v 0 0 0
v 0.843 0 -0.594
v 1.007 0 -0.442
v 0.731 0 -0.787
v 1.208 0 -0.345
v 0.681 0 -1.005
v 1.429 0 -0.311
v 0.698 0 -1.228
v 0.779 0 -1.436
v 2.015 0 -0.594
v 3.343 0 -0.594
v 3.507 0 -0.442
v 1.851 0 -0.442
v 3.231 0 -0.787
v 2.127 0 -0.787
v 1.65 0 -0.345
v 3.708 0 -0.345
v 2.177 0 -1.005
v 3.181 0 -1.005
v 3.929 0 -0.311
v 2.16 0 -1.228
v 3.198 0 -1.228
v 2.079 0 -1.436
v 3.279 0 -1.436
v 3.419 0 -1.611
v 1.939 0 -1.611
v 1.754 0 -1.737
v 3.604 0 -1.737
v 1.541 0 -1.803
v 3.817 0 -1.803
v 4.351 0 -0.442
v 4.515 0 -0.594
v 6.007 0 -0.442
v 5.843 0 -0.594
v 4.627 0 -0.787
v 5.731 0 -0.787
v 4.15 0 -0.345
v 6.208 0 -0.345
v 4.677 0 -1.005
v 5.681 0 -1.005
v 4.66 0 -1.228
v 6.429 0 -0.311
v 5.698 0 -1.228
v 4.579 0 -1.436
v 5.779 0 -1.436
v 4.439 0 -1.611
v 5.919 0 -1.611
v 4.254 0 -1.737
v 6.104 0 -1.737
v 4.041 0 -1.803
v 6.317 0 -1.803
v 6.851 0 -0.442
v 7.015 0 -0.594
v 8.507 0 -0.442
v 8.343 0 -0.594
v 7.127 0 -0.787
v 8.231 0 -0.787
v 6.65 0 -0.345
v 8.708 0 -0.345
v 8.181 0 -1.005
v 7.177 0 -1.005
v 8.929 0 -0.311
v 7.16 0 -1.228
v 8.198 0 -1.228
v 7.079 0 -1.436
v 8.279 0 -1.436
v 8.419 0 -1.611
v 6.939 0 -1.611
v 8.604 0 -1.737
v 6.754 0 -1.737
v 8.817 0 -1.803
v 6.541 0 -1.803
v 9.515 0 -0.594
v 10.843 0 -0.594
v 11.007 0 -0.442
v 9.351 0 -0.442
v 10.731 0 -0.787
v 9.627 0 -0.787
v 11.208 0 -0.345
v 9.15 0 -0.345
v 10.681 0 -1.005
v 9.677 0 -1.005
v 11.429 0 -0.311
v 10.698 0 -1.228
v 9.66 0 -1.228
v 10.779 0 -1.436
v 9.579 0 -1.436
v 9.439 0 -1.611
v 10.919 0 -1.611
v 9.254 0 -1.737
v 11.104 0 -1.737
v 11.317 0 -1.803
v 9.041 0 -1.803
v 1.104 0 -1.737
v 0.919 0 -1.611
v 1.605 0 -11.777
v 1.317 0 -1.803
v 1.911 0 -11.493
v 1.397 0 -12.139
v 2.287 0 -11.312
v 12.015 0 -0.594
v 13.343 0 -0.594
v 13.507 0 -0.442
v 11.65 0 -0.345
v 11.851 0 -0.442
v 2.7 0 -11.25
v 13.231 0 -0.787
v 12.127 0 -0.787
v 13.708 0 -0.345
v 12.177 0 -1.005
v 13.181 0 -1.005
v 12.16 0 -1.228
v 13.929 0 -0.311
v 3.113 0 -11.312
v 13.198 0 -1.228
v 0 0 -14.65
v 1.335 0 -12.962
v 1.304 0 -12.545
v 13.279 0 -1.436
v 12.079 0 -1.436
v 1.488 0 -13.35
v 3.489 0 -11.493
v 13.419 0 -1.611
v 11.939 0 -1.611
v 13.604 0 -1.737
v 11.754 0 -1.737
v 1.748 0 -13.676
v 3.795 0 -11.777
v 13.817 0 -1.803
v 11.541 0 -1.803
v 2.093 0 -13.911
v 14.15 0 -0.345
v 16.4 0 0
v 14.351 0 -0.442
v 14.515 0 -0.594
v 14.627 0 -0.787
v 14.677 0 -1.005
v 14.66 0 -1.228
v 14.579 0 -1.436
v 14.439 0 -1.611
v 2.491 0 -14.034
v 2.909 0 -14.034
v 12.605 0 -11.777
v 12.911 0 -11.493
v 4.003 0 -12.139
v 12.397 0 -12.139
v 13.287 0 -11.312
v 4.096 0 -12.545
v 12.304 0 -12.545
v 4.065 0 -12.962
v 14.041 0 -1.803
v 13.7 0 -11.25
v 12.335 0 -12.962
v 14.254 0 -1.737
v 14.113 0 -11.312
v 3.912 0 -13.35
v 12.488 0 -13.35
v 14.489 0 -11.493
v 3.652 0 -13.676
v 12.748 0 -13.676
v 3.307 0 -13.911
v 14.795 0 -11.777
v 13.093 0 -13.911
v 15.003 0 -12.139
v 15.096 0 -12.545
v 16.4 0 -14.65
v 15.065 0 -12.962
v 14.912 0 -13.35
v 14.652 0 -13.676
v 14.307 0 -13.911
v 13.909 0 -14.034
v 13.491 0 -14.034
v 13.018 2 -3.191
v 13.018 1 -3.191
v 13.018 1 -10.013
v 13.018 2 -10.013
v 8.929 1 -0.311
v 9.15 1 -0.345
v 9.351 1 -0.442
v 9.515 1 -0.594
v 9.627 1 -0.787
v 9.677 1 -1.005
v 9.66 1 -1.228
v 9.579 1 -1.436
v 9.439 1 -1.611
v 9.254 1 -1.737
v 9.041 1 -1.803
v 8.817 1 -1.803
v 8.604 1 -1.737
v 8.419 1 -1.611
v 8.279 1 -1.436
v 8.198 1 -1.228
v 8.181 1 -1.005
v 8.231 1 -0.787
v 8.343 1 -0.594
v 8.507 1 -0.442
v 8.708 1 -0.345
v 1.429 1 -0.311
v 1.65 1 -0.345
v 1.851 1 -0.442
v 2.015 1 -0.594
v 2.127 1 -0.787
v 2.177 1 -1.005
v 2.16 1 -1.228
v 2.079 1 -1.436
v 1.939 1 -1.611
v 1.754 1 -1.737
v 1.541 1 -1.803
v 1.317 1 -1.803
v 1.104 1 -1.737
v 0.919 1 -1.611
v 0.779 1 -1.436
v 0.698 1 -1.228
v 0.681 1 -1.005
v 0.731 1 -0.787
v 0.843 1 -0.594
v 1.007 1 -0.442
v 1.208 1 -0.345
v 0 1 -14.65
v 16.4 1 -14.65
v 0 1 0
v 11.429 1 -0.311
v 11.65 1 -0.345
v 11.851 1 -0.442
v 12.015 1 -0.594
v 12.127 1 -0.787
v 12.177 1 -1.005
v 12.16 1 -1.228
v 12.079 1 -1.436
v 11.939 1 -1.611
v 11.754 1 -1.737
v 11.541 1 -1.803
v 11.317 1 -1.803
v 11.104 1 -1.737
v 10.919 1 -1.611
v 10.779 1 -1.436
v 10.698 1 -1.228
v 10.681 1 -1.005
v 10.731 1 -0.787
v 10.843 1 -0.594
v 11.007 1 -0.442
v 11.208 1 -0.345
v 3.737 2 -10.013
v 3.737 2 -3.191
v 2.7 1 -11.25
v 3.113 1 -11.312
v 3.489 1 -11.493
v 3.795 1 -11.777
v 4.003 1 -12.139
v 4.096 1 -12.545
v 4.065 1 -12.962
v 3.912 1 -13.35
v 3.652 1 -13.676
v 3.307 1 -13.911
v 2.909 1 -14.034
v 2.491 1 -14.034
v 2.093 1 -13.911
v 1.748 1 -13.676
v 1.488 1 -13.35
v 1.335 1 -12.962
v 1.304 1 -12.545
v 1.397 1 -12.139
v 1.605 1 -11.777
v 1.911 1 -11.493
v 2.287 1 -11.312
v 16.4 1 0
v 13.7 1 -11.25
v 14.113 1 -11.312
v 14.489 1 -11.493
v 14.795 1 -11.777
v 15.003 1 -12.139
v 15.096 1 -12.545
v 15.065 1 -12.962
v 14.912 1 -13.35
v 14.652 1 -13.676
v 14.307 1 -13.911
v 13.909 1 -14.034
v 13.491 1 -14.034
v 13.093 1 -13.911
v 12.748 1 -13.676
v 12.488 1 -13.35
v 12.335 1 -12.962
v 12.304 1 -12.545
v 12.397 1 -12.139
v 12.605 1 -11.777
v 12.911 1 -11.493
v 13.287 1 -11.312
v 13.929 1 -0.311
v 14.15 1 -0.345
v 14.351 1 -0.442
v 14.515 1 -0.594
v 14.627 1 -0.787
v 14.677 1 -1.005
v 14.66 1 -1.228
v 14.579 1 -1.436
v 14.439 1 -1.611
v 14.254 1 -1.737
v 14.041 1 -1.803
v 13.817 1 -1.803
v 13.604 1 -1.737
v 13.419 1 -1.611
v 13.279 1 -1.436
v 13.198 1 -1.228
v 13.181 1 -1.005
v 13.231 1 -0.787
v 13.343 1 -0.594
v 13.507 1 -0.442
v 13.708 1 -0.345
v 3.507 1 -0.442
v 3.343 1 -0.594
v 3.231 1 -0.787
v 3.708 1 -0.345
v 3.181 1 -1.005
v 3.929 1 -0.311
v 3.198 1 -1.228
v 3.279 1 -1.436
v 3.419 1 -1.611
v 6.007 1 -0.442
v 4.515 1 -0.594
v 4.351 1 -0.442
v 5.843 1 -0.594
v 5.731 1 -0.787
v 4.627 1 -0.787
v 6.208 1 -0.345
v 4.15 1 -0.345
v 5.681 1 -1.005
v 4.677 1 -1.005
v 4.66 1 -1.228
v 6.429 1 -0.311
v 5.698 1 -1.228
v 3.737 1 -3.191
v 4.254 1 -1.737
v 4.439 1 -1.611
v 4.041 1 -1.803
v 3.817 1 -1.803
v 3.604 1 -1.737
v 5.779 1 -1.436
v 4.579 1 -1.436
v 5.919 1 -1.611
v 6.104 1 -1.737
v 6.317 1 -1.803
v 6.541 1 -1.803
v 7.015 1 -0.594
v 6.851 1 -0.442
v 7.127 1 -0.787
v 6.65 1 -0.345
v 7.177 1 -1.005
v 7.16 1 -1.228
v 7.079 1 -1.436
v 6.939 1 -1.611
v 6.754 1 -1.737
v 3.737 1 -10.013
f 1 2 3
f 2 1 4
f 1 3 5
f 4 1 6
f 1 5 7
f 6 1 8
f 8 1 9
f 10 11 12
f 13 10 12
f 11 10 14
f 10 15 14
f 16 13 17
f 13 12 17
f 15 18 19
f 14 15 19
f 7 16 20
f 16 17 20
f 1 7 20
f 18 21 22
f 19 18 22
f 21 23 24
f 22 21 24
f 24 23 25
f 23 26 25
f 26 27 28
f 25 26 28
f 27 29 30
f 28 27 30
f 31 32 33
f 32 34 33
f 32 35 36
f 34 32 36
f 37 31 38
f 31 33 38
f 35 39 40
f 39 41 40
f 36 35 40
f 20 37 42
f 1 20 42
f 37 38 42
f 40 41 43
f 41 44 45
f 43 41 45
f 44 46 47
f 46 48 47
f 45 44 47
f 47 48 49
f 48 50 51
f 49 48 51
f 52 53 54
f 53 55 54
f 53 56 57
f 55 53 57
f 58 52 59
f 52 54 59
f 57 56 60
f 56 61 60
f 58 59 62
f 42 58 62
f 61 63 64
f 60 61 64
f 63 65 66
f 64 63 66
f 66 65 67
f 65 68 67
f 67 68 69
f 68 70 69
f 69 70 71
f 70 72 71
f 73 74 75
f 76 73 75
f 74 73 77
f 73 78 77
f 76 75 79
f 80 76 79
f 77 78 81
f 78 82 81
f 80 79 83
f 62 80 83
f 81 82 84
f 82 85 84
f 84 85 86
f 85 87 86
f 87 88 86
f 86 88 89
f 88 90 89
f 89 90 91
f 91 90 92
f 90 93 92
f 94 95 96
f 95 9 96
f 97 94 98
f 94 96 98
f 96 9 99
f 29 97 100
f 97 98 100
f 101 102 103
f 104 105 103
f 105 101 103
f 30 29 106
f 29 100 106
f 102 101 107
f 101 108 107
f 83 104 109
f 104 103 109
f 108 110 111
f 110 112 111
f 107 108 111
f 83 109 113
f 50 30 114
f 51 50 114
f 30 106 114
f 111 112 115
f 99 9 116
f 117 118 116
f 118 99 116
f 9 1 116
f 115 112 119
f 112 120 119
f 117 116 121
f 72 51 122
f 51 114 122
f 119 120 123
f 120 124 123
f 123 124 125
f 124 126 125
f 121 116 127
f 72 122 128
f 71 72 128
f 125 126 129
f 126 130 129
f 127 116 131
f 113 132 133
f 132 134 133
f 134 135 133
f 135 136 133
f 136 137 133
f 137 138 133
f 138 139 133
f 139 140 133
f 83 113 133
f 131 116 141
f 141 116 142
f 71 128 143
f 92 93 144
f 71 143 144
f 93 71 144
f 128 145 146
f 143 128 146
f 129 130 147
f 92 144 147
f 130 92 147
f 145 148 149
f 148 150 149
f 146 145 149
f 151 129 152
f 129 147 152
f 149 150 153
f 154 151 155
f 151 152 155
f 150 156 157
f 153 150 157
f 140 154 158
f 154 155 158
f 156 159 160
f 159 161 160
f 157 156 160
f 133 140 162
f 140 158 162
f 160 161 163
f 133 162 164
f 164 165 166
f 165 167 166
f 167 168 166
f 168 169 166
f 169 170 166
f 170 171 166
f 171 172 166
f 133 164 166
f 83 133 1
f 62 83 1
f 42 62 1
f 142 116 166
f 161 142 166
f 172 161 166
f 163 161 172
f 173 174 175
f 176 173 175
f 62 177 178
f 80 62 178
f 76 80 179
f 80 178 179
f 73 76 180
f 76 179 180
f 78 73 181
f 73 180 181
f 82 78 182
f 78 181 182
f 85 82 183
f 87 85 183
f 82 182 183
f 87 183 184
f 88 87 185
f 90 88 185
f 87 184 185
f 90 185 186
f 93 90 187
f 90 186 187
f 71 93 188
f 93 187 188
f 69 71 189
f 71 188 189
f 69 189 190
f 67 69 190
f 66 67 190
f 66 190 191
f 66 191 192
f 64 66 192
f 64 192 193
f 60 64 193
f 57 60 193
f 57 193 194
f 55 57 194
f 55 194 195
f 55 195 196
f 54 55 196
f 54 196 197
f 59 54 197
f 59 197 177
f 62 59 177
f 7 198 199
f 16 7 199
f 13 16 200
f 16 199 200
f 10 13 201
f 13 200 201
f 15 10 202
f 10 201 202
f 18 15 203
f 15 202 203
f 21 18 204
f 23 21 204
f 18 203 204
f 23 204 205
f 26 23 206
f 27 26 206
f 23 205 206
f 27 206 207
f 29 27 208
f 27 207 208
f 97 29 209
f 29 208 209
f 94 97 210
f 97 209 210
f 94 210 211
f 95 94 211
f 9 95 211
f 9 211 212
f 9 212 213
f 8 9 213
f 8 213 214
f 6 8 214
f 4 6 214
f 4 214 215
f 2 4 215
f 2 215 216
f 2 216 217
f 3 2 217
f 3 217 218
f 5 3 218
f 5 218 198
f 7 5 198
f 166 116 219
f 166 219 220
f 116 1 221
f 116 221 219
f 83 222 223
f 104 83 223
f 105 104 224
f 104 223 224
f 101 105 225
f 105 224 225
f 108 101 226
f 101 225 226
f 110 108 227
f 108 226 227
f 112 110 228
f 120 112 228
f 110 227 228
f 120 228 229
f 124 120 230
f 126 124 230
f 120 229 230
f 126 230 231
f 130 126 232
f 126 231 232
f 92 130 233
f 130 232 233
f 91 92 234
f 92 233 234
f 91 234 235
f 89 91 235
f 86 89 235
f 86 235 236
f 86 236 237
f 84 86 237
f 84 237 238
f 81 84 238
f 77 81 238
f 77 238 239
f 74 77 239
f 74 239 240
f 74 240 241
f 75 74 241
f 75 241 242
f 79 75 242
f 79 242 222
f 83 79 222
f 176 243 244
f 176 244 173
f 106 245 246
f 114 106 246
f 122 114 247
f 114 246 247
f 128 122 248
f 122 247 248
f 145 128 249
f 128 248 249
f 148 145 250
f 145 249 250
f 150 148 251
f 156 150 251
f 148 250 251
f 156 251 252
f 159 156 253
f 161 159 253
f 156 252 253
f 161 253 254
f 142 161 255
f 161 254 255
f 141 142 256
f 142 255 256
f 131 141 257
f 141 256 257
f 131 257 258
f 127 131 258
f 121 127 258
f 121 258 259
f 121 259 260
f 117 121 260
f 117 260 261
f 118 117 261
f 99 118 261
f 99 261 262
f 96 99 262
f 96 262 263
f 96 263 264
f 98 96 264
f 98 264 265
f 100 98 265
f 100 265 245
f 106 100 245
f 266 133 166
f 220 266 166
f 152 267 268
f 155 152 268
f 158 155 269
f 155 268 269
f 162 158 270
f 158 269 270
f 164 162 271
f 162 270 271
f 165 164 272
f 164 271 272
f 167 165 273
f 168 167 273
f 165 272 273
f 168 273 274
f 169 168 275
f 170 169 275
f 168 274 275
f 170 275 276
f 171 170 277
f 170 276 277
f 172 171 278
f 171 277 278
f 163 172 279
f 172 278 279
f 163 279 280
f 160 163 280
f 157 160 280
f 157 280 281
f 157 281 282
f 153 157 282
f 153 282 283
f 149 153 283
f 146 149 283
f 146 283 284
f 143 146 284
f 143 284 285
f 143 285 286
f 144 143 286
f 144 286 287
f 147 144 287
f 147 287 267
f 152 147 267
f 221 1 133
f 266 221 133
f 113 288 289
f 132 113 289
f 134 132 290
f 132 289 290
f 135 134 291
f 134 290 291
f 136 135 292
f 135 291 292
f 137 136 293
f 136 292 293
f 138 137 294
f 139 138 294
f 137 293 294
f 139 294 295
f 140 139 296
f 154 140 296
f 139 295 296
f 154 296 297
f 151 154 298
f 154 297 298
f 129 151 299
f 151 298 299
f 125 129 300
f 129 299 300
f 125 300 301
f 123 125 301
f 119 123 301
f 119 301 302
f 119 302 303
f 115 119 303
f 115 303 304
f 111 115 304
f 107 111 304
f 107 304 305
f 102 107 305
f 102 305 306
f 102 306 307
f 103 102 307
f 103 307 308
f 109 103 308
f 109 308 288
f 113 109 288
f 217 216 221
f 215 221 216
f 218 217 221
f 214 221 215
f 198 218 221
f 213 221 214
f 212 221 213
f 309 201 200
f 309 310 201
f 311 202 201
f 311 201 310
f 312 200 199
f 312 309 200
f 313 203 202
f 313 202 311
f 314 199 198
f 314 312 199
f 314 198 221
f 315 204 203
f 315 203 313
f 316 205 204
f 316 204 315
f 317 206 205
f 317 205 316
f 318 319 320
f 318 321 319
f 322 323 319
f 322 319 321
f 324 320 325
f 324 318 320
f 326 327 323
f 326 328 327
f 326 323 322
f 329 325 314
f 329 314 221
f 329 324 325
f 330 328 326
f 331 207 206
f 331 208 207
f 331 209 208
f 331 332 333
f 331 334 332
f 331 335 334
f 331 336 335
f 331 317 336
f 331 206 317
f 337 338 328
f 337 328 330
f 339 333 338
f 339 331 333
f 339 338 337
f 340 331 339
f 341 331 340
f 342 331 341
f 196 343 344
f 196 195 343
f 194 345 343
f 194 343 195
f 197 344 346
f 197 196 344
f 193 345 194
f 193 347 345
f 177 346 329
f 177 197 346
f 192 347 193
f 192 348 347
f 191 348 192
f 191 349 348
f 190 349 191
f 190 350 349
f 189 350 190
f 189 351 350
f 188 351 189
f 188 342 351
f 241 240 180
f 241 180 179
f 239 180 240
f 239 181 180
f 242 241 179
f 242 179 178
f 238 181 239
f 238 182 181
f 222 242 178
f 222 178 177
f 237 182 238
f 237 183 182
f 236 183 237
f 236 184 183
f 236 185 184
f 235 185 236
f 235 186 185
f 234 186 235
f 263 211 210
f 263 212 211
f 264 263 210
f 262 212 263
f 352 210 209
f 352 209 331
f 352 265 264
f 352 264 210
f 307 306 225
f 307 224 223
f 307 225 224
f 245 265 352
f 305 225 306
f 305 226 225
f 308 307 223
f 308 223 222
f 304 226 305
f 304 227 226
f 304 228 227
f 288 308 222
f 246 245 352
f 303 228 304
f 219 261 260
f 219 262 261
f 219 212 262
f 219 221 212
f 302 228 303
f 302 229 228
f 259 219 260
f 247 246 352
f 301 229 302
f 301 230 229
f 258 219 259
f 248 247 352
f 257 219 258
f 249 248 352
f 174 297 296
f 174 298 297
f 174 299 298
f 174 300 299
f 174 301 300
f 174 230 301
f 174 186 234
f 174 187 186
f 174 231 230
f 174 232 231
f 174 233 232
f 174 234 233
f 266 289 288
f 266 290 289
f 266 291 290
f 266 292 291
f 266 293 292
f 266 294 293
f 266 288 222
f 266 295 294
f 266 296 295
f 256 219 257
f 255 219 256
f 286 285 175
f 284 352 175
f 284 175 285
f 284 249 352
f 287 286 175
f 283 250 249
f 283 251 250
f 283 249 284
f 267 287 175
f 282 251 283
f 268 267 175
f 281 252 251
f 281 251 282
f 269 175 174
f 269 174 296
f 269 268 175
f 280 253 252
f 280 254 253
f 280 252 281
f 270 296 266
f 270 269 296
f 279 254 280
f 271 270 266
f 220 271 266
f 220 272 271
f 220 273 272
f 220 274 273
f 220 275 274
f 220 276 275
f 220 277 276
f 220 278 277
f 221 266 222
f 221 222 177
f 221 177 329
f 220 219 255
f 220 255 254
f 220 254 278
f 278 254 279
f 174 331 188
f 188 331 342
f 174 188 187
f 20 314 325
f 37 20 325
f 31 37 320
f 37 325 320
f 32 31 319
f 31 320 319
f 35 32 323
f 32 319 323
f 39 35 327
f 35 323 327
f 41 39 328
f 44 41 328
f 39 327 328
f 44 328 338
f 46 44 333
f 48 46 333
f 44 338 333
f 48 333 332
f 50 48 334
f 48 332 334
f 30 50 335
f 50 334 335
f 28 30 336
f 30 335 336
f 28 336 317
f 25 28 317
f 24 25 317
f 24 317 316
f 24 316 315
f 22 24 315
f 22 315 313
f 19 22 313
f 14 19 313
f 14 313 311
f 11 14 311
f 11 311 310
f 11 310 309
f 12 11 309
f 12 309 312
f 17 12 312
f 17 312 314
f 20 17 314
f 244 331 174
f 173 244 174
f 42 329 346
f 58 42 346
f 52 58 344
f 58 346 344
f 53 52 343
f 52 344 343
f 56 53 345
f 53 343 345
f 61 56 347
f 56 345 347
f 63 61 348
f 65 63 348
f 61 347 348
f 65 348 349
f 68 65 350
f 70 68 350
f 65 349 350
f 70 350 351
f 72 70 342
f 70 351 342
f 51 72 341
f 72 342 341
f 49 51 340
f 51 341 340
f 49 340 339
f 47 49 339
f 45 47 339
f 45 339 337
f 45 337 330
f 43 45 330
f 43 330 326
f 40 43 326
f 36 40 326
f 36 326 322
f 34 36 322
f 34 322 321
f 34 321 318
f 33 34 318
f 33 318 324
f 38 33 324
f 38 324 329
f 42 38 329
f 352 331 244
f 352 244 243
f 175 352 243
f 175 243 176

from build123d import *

# Parameters (mm, degrees)
SKETCH1_W           = 16.4
SKETCH1_H           = 14.65
BOSS_EXTRUDE1_DEPTH = 1
SKETCH2_R           = 0.75
SKETCH2_R_2         = 1.4
CUT_EXTRUDE1_DEPTH  = 23.013234656
SKETCH3_W           = 9.281589498
SKETCH3_H           = 6.821714685
BOSS_EXTRUDE2_DEPTH = 1


with BuildPart() as part:
    # Sketch1 → Boss-Extrude1 (new body)
    with BuildSketch(Plane(origin=(0, 0, 0), x_dir=(1, 0, 0), z_dir=(0, 1, 0))):
        with Locations((8.2, 7.325)):
            Rectangle(SKETCH1_W, SKETCH1_H)
    extrude(amount=BOSS_EXTRUDE1_DEPTH)

    # Sketch2 → Cut-Extrude1 (cut, through all)
    with BuildSketch(Plane(origin=(0, 1, 0), x_dir=(1, 0, 0), z_dir=(0, 1, 0))):
        with Locations(Location((1.429004383, 1.061195066, 0), (0, 0, 270))):
            Circle(SKETCH2_R)
        with Locations(Location((3.929004383, 1.061195066, 0), (0, 0, 270))):
            Circle(SKETCH2_R)
        with Locations(Location((6.429004383, 1.061195066, 0), (0, 0, 270))):
            Circle(SKETCH2_R)
        with Locations(Location((8.929004383, 1.061195066, 0), (0, 0, 270))):
            Circle(SKETCH2_R)
        with Locations(Location((11.429004383, 1.061195066, 0), (0, 0, 270))):
            Circle(SKETCH2_R)
        with Locations(Location((13.929004383, 1.061195066, 0), (0, 0, 270))):
            Circle(SKETCH2_R)
        with Locations(Location((2.7, 12.65, 0), (0, 0, 270))):
            Circle(SKETCH2_R_2)
        with Locations(Location((13.7, 12.65, 0), (0, 0, 270))):
            Circle(SKETCH2_R_2)
    extrude(amount=-CUT_EXTRUDE1_DEPTH, mode=Mode.SUBTRACT)

    # Sketch3 → Boss-Extrude2 (add)
    with BuildSketch(Plane(origin=(0, 1, 0), x_dir=(1, 0, 0), z_dir=(0, 1, 0))):
        with Locations((8.377516739, 6.602253277)):
            Rectangle(SKETCH3_W, SKETCH3_H)
    extrude(amount=BOSS_EXTRUDE2_DEPTH)


solid = part.part
